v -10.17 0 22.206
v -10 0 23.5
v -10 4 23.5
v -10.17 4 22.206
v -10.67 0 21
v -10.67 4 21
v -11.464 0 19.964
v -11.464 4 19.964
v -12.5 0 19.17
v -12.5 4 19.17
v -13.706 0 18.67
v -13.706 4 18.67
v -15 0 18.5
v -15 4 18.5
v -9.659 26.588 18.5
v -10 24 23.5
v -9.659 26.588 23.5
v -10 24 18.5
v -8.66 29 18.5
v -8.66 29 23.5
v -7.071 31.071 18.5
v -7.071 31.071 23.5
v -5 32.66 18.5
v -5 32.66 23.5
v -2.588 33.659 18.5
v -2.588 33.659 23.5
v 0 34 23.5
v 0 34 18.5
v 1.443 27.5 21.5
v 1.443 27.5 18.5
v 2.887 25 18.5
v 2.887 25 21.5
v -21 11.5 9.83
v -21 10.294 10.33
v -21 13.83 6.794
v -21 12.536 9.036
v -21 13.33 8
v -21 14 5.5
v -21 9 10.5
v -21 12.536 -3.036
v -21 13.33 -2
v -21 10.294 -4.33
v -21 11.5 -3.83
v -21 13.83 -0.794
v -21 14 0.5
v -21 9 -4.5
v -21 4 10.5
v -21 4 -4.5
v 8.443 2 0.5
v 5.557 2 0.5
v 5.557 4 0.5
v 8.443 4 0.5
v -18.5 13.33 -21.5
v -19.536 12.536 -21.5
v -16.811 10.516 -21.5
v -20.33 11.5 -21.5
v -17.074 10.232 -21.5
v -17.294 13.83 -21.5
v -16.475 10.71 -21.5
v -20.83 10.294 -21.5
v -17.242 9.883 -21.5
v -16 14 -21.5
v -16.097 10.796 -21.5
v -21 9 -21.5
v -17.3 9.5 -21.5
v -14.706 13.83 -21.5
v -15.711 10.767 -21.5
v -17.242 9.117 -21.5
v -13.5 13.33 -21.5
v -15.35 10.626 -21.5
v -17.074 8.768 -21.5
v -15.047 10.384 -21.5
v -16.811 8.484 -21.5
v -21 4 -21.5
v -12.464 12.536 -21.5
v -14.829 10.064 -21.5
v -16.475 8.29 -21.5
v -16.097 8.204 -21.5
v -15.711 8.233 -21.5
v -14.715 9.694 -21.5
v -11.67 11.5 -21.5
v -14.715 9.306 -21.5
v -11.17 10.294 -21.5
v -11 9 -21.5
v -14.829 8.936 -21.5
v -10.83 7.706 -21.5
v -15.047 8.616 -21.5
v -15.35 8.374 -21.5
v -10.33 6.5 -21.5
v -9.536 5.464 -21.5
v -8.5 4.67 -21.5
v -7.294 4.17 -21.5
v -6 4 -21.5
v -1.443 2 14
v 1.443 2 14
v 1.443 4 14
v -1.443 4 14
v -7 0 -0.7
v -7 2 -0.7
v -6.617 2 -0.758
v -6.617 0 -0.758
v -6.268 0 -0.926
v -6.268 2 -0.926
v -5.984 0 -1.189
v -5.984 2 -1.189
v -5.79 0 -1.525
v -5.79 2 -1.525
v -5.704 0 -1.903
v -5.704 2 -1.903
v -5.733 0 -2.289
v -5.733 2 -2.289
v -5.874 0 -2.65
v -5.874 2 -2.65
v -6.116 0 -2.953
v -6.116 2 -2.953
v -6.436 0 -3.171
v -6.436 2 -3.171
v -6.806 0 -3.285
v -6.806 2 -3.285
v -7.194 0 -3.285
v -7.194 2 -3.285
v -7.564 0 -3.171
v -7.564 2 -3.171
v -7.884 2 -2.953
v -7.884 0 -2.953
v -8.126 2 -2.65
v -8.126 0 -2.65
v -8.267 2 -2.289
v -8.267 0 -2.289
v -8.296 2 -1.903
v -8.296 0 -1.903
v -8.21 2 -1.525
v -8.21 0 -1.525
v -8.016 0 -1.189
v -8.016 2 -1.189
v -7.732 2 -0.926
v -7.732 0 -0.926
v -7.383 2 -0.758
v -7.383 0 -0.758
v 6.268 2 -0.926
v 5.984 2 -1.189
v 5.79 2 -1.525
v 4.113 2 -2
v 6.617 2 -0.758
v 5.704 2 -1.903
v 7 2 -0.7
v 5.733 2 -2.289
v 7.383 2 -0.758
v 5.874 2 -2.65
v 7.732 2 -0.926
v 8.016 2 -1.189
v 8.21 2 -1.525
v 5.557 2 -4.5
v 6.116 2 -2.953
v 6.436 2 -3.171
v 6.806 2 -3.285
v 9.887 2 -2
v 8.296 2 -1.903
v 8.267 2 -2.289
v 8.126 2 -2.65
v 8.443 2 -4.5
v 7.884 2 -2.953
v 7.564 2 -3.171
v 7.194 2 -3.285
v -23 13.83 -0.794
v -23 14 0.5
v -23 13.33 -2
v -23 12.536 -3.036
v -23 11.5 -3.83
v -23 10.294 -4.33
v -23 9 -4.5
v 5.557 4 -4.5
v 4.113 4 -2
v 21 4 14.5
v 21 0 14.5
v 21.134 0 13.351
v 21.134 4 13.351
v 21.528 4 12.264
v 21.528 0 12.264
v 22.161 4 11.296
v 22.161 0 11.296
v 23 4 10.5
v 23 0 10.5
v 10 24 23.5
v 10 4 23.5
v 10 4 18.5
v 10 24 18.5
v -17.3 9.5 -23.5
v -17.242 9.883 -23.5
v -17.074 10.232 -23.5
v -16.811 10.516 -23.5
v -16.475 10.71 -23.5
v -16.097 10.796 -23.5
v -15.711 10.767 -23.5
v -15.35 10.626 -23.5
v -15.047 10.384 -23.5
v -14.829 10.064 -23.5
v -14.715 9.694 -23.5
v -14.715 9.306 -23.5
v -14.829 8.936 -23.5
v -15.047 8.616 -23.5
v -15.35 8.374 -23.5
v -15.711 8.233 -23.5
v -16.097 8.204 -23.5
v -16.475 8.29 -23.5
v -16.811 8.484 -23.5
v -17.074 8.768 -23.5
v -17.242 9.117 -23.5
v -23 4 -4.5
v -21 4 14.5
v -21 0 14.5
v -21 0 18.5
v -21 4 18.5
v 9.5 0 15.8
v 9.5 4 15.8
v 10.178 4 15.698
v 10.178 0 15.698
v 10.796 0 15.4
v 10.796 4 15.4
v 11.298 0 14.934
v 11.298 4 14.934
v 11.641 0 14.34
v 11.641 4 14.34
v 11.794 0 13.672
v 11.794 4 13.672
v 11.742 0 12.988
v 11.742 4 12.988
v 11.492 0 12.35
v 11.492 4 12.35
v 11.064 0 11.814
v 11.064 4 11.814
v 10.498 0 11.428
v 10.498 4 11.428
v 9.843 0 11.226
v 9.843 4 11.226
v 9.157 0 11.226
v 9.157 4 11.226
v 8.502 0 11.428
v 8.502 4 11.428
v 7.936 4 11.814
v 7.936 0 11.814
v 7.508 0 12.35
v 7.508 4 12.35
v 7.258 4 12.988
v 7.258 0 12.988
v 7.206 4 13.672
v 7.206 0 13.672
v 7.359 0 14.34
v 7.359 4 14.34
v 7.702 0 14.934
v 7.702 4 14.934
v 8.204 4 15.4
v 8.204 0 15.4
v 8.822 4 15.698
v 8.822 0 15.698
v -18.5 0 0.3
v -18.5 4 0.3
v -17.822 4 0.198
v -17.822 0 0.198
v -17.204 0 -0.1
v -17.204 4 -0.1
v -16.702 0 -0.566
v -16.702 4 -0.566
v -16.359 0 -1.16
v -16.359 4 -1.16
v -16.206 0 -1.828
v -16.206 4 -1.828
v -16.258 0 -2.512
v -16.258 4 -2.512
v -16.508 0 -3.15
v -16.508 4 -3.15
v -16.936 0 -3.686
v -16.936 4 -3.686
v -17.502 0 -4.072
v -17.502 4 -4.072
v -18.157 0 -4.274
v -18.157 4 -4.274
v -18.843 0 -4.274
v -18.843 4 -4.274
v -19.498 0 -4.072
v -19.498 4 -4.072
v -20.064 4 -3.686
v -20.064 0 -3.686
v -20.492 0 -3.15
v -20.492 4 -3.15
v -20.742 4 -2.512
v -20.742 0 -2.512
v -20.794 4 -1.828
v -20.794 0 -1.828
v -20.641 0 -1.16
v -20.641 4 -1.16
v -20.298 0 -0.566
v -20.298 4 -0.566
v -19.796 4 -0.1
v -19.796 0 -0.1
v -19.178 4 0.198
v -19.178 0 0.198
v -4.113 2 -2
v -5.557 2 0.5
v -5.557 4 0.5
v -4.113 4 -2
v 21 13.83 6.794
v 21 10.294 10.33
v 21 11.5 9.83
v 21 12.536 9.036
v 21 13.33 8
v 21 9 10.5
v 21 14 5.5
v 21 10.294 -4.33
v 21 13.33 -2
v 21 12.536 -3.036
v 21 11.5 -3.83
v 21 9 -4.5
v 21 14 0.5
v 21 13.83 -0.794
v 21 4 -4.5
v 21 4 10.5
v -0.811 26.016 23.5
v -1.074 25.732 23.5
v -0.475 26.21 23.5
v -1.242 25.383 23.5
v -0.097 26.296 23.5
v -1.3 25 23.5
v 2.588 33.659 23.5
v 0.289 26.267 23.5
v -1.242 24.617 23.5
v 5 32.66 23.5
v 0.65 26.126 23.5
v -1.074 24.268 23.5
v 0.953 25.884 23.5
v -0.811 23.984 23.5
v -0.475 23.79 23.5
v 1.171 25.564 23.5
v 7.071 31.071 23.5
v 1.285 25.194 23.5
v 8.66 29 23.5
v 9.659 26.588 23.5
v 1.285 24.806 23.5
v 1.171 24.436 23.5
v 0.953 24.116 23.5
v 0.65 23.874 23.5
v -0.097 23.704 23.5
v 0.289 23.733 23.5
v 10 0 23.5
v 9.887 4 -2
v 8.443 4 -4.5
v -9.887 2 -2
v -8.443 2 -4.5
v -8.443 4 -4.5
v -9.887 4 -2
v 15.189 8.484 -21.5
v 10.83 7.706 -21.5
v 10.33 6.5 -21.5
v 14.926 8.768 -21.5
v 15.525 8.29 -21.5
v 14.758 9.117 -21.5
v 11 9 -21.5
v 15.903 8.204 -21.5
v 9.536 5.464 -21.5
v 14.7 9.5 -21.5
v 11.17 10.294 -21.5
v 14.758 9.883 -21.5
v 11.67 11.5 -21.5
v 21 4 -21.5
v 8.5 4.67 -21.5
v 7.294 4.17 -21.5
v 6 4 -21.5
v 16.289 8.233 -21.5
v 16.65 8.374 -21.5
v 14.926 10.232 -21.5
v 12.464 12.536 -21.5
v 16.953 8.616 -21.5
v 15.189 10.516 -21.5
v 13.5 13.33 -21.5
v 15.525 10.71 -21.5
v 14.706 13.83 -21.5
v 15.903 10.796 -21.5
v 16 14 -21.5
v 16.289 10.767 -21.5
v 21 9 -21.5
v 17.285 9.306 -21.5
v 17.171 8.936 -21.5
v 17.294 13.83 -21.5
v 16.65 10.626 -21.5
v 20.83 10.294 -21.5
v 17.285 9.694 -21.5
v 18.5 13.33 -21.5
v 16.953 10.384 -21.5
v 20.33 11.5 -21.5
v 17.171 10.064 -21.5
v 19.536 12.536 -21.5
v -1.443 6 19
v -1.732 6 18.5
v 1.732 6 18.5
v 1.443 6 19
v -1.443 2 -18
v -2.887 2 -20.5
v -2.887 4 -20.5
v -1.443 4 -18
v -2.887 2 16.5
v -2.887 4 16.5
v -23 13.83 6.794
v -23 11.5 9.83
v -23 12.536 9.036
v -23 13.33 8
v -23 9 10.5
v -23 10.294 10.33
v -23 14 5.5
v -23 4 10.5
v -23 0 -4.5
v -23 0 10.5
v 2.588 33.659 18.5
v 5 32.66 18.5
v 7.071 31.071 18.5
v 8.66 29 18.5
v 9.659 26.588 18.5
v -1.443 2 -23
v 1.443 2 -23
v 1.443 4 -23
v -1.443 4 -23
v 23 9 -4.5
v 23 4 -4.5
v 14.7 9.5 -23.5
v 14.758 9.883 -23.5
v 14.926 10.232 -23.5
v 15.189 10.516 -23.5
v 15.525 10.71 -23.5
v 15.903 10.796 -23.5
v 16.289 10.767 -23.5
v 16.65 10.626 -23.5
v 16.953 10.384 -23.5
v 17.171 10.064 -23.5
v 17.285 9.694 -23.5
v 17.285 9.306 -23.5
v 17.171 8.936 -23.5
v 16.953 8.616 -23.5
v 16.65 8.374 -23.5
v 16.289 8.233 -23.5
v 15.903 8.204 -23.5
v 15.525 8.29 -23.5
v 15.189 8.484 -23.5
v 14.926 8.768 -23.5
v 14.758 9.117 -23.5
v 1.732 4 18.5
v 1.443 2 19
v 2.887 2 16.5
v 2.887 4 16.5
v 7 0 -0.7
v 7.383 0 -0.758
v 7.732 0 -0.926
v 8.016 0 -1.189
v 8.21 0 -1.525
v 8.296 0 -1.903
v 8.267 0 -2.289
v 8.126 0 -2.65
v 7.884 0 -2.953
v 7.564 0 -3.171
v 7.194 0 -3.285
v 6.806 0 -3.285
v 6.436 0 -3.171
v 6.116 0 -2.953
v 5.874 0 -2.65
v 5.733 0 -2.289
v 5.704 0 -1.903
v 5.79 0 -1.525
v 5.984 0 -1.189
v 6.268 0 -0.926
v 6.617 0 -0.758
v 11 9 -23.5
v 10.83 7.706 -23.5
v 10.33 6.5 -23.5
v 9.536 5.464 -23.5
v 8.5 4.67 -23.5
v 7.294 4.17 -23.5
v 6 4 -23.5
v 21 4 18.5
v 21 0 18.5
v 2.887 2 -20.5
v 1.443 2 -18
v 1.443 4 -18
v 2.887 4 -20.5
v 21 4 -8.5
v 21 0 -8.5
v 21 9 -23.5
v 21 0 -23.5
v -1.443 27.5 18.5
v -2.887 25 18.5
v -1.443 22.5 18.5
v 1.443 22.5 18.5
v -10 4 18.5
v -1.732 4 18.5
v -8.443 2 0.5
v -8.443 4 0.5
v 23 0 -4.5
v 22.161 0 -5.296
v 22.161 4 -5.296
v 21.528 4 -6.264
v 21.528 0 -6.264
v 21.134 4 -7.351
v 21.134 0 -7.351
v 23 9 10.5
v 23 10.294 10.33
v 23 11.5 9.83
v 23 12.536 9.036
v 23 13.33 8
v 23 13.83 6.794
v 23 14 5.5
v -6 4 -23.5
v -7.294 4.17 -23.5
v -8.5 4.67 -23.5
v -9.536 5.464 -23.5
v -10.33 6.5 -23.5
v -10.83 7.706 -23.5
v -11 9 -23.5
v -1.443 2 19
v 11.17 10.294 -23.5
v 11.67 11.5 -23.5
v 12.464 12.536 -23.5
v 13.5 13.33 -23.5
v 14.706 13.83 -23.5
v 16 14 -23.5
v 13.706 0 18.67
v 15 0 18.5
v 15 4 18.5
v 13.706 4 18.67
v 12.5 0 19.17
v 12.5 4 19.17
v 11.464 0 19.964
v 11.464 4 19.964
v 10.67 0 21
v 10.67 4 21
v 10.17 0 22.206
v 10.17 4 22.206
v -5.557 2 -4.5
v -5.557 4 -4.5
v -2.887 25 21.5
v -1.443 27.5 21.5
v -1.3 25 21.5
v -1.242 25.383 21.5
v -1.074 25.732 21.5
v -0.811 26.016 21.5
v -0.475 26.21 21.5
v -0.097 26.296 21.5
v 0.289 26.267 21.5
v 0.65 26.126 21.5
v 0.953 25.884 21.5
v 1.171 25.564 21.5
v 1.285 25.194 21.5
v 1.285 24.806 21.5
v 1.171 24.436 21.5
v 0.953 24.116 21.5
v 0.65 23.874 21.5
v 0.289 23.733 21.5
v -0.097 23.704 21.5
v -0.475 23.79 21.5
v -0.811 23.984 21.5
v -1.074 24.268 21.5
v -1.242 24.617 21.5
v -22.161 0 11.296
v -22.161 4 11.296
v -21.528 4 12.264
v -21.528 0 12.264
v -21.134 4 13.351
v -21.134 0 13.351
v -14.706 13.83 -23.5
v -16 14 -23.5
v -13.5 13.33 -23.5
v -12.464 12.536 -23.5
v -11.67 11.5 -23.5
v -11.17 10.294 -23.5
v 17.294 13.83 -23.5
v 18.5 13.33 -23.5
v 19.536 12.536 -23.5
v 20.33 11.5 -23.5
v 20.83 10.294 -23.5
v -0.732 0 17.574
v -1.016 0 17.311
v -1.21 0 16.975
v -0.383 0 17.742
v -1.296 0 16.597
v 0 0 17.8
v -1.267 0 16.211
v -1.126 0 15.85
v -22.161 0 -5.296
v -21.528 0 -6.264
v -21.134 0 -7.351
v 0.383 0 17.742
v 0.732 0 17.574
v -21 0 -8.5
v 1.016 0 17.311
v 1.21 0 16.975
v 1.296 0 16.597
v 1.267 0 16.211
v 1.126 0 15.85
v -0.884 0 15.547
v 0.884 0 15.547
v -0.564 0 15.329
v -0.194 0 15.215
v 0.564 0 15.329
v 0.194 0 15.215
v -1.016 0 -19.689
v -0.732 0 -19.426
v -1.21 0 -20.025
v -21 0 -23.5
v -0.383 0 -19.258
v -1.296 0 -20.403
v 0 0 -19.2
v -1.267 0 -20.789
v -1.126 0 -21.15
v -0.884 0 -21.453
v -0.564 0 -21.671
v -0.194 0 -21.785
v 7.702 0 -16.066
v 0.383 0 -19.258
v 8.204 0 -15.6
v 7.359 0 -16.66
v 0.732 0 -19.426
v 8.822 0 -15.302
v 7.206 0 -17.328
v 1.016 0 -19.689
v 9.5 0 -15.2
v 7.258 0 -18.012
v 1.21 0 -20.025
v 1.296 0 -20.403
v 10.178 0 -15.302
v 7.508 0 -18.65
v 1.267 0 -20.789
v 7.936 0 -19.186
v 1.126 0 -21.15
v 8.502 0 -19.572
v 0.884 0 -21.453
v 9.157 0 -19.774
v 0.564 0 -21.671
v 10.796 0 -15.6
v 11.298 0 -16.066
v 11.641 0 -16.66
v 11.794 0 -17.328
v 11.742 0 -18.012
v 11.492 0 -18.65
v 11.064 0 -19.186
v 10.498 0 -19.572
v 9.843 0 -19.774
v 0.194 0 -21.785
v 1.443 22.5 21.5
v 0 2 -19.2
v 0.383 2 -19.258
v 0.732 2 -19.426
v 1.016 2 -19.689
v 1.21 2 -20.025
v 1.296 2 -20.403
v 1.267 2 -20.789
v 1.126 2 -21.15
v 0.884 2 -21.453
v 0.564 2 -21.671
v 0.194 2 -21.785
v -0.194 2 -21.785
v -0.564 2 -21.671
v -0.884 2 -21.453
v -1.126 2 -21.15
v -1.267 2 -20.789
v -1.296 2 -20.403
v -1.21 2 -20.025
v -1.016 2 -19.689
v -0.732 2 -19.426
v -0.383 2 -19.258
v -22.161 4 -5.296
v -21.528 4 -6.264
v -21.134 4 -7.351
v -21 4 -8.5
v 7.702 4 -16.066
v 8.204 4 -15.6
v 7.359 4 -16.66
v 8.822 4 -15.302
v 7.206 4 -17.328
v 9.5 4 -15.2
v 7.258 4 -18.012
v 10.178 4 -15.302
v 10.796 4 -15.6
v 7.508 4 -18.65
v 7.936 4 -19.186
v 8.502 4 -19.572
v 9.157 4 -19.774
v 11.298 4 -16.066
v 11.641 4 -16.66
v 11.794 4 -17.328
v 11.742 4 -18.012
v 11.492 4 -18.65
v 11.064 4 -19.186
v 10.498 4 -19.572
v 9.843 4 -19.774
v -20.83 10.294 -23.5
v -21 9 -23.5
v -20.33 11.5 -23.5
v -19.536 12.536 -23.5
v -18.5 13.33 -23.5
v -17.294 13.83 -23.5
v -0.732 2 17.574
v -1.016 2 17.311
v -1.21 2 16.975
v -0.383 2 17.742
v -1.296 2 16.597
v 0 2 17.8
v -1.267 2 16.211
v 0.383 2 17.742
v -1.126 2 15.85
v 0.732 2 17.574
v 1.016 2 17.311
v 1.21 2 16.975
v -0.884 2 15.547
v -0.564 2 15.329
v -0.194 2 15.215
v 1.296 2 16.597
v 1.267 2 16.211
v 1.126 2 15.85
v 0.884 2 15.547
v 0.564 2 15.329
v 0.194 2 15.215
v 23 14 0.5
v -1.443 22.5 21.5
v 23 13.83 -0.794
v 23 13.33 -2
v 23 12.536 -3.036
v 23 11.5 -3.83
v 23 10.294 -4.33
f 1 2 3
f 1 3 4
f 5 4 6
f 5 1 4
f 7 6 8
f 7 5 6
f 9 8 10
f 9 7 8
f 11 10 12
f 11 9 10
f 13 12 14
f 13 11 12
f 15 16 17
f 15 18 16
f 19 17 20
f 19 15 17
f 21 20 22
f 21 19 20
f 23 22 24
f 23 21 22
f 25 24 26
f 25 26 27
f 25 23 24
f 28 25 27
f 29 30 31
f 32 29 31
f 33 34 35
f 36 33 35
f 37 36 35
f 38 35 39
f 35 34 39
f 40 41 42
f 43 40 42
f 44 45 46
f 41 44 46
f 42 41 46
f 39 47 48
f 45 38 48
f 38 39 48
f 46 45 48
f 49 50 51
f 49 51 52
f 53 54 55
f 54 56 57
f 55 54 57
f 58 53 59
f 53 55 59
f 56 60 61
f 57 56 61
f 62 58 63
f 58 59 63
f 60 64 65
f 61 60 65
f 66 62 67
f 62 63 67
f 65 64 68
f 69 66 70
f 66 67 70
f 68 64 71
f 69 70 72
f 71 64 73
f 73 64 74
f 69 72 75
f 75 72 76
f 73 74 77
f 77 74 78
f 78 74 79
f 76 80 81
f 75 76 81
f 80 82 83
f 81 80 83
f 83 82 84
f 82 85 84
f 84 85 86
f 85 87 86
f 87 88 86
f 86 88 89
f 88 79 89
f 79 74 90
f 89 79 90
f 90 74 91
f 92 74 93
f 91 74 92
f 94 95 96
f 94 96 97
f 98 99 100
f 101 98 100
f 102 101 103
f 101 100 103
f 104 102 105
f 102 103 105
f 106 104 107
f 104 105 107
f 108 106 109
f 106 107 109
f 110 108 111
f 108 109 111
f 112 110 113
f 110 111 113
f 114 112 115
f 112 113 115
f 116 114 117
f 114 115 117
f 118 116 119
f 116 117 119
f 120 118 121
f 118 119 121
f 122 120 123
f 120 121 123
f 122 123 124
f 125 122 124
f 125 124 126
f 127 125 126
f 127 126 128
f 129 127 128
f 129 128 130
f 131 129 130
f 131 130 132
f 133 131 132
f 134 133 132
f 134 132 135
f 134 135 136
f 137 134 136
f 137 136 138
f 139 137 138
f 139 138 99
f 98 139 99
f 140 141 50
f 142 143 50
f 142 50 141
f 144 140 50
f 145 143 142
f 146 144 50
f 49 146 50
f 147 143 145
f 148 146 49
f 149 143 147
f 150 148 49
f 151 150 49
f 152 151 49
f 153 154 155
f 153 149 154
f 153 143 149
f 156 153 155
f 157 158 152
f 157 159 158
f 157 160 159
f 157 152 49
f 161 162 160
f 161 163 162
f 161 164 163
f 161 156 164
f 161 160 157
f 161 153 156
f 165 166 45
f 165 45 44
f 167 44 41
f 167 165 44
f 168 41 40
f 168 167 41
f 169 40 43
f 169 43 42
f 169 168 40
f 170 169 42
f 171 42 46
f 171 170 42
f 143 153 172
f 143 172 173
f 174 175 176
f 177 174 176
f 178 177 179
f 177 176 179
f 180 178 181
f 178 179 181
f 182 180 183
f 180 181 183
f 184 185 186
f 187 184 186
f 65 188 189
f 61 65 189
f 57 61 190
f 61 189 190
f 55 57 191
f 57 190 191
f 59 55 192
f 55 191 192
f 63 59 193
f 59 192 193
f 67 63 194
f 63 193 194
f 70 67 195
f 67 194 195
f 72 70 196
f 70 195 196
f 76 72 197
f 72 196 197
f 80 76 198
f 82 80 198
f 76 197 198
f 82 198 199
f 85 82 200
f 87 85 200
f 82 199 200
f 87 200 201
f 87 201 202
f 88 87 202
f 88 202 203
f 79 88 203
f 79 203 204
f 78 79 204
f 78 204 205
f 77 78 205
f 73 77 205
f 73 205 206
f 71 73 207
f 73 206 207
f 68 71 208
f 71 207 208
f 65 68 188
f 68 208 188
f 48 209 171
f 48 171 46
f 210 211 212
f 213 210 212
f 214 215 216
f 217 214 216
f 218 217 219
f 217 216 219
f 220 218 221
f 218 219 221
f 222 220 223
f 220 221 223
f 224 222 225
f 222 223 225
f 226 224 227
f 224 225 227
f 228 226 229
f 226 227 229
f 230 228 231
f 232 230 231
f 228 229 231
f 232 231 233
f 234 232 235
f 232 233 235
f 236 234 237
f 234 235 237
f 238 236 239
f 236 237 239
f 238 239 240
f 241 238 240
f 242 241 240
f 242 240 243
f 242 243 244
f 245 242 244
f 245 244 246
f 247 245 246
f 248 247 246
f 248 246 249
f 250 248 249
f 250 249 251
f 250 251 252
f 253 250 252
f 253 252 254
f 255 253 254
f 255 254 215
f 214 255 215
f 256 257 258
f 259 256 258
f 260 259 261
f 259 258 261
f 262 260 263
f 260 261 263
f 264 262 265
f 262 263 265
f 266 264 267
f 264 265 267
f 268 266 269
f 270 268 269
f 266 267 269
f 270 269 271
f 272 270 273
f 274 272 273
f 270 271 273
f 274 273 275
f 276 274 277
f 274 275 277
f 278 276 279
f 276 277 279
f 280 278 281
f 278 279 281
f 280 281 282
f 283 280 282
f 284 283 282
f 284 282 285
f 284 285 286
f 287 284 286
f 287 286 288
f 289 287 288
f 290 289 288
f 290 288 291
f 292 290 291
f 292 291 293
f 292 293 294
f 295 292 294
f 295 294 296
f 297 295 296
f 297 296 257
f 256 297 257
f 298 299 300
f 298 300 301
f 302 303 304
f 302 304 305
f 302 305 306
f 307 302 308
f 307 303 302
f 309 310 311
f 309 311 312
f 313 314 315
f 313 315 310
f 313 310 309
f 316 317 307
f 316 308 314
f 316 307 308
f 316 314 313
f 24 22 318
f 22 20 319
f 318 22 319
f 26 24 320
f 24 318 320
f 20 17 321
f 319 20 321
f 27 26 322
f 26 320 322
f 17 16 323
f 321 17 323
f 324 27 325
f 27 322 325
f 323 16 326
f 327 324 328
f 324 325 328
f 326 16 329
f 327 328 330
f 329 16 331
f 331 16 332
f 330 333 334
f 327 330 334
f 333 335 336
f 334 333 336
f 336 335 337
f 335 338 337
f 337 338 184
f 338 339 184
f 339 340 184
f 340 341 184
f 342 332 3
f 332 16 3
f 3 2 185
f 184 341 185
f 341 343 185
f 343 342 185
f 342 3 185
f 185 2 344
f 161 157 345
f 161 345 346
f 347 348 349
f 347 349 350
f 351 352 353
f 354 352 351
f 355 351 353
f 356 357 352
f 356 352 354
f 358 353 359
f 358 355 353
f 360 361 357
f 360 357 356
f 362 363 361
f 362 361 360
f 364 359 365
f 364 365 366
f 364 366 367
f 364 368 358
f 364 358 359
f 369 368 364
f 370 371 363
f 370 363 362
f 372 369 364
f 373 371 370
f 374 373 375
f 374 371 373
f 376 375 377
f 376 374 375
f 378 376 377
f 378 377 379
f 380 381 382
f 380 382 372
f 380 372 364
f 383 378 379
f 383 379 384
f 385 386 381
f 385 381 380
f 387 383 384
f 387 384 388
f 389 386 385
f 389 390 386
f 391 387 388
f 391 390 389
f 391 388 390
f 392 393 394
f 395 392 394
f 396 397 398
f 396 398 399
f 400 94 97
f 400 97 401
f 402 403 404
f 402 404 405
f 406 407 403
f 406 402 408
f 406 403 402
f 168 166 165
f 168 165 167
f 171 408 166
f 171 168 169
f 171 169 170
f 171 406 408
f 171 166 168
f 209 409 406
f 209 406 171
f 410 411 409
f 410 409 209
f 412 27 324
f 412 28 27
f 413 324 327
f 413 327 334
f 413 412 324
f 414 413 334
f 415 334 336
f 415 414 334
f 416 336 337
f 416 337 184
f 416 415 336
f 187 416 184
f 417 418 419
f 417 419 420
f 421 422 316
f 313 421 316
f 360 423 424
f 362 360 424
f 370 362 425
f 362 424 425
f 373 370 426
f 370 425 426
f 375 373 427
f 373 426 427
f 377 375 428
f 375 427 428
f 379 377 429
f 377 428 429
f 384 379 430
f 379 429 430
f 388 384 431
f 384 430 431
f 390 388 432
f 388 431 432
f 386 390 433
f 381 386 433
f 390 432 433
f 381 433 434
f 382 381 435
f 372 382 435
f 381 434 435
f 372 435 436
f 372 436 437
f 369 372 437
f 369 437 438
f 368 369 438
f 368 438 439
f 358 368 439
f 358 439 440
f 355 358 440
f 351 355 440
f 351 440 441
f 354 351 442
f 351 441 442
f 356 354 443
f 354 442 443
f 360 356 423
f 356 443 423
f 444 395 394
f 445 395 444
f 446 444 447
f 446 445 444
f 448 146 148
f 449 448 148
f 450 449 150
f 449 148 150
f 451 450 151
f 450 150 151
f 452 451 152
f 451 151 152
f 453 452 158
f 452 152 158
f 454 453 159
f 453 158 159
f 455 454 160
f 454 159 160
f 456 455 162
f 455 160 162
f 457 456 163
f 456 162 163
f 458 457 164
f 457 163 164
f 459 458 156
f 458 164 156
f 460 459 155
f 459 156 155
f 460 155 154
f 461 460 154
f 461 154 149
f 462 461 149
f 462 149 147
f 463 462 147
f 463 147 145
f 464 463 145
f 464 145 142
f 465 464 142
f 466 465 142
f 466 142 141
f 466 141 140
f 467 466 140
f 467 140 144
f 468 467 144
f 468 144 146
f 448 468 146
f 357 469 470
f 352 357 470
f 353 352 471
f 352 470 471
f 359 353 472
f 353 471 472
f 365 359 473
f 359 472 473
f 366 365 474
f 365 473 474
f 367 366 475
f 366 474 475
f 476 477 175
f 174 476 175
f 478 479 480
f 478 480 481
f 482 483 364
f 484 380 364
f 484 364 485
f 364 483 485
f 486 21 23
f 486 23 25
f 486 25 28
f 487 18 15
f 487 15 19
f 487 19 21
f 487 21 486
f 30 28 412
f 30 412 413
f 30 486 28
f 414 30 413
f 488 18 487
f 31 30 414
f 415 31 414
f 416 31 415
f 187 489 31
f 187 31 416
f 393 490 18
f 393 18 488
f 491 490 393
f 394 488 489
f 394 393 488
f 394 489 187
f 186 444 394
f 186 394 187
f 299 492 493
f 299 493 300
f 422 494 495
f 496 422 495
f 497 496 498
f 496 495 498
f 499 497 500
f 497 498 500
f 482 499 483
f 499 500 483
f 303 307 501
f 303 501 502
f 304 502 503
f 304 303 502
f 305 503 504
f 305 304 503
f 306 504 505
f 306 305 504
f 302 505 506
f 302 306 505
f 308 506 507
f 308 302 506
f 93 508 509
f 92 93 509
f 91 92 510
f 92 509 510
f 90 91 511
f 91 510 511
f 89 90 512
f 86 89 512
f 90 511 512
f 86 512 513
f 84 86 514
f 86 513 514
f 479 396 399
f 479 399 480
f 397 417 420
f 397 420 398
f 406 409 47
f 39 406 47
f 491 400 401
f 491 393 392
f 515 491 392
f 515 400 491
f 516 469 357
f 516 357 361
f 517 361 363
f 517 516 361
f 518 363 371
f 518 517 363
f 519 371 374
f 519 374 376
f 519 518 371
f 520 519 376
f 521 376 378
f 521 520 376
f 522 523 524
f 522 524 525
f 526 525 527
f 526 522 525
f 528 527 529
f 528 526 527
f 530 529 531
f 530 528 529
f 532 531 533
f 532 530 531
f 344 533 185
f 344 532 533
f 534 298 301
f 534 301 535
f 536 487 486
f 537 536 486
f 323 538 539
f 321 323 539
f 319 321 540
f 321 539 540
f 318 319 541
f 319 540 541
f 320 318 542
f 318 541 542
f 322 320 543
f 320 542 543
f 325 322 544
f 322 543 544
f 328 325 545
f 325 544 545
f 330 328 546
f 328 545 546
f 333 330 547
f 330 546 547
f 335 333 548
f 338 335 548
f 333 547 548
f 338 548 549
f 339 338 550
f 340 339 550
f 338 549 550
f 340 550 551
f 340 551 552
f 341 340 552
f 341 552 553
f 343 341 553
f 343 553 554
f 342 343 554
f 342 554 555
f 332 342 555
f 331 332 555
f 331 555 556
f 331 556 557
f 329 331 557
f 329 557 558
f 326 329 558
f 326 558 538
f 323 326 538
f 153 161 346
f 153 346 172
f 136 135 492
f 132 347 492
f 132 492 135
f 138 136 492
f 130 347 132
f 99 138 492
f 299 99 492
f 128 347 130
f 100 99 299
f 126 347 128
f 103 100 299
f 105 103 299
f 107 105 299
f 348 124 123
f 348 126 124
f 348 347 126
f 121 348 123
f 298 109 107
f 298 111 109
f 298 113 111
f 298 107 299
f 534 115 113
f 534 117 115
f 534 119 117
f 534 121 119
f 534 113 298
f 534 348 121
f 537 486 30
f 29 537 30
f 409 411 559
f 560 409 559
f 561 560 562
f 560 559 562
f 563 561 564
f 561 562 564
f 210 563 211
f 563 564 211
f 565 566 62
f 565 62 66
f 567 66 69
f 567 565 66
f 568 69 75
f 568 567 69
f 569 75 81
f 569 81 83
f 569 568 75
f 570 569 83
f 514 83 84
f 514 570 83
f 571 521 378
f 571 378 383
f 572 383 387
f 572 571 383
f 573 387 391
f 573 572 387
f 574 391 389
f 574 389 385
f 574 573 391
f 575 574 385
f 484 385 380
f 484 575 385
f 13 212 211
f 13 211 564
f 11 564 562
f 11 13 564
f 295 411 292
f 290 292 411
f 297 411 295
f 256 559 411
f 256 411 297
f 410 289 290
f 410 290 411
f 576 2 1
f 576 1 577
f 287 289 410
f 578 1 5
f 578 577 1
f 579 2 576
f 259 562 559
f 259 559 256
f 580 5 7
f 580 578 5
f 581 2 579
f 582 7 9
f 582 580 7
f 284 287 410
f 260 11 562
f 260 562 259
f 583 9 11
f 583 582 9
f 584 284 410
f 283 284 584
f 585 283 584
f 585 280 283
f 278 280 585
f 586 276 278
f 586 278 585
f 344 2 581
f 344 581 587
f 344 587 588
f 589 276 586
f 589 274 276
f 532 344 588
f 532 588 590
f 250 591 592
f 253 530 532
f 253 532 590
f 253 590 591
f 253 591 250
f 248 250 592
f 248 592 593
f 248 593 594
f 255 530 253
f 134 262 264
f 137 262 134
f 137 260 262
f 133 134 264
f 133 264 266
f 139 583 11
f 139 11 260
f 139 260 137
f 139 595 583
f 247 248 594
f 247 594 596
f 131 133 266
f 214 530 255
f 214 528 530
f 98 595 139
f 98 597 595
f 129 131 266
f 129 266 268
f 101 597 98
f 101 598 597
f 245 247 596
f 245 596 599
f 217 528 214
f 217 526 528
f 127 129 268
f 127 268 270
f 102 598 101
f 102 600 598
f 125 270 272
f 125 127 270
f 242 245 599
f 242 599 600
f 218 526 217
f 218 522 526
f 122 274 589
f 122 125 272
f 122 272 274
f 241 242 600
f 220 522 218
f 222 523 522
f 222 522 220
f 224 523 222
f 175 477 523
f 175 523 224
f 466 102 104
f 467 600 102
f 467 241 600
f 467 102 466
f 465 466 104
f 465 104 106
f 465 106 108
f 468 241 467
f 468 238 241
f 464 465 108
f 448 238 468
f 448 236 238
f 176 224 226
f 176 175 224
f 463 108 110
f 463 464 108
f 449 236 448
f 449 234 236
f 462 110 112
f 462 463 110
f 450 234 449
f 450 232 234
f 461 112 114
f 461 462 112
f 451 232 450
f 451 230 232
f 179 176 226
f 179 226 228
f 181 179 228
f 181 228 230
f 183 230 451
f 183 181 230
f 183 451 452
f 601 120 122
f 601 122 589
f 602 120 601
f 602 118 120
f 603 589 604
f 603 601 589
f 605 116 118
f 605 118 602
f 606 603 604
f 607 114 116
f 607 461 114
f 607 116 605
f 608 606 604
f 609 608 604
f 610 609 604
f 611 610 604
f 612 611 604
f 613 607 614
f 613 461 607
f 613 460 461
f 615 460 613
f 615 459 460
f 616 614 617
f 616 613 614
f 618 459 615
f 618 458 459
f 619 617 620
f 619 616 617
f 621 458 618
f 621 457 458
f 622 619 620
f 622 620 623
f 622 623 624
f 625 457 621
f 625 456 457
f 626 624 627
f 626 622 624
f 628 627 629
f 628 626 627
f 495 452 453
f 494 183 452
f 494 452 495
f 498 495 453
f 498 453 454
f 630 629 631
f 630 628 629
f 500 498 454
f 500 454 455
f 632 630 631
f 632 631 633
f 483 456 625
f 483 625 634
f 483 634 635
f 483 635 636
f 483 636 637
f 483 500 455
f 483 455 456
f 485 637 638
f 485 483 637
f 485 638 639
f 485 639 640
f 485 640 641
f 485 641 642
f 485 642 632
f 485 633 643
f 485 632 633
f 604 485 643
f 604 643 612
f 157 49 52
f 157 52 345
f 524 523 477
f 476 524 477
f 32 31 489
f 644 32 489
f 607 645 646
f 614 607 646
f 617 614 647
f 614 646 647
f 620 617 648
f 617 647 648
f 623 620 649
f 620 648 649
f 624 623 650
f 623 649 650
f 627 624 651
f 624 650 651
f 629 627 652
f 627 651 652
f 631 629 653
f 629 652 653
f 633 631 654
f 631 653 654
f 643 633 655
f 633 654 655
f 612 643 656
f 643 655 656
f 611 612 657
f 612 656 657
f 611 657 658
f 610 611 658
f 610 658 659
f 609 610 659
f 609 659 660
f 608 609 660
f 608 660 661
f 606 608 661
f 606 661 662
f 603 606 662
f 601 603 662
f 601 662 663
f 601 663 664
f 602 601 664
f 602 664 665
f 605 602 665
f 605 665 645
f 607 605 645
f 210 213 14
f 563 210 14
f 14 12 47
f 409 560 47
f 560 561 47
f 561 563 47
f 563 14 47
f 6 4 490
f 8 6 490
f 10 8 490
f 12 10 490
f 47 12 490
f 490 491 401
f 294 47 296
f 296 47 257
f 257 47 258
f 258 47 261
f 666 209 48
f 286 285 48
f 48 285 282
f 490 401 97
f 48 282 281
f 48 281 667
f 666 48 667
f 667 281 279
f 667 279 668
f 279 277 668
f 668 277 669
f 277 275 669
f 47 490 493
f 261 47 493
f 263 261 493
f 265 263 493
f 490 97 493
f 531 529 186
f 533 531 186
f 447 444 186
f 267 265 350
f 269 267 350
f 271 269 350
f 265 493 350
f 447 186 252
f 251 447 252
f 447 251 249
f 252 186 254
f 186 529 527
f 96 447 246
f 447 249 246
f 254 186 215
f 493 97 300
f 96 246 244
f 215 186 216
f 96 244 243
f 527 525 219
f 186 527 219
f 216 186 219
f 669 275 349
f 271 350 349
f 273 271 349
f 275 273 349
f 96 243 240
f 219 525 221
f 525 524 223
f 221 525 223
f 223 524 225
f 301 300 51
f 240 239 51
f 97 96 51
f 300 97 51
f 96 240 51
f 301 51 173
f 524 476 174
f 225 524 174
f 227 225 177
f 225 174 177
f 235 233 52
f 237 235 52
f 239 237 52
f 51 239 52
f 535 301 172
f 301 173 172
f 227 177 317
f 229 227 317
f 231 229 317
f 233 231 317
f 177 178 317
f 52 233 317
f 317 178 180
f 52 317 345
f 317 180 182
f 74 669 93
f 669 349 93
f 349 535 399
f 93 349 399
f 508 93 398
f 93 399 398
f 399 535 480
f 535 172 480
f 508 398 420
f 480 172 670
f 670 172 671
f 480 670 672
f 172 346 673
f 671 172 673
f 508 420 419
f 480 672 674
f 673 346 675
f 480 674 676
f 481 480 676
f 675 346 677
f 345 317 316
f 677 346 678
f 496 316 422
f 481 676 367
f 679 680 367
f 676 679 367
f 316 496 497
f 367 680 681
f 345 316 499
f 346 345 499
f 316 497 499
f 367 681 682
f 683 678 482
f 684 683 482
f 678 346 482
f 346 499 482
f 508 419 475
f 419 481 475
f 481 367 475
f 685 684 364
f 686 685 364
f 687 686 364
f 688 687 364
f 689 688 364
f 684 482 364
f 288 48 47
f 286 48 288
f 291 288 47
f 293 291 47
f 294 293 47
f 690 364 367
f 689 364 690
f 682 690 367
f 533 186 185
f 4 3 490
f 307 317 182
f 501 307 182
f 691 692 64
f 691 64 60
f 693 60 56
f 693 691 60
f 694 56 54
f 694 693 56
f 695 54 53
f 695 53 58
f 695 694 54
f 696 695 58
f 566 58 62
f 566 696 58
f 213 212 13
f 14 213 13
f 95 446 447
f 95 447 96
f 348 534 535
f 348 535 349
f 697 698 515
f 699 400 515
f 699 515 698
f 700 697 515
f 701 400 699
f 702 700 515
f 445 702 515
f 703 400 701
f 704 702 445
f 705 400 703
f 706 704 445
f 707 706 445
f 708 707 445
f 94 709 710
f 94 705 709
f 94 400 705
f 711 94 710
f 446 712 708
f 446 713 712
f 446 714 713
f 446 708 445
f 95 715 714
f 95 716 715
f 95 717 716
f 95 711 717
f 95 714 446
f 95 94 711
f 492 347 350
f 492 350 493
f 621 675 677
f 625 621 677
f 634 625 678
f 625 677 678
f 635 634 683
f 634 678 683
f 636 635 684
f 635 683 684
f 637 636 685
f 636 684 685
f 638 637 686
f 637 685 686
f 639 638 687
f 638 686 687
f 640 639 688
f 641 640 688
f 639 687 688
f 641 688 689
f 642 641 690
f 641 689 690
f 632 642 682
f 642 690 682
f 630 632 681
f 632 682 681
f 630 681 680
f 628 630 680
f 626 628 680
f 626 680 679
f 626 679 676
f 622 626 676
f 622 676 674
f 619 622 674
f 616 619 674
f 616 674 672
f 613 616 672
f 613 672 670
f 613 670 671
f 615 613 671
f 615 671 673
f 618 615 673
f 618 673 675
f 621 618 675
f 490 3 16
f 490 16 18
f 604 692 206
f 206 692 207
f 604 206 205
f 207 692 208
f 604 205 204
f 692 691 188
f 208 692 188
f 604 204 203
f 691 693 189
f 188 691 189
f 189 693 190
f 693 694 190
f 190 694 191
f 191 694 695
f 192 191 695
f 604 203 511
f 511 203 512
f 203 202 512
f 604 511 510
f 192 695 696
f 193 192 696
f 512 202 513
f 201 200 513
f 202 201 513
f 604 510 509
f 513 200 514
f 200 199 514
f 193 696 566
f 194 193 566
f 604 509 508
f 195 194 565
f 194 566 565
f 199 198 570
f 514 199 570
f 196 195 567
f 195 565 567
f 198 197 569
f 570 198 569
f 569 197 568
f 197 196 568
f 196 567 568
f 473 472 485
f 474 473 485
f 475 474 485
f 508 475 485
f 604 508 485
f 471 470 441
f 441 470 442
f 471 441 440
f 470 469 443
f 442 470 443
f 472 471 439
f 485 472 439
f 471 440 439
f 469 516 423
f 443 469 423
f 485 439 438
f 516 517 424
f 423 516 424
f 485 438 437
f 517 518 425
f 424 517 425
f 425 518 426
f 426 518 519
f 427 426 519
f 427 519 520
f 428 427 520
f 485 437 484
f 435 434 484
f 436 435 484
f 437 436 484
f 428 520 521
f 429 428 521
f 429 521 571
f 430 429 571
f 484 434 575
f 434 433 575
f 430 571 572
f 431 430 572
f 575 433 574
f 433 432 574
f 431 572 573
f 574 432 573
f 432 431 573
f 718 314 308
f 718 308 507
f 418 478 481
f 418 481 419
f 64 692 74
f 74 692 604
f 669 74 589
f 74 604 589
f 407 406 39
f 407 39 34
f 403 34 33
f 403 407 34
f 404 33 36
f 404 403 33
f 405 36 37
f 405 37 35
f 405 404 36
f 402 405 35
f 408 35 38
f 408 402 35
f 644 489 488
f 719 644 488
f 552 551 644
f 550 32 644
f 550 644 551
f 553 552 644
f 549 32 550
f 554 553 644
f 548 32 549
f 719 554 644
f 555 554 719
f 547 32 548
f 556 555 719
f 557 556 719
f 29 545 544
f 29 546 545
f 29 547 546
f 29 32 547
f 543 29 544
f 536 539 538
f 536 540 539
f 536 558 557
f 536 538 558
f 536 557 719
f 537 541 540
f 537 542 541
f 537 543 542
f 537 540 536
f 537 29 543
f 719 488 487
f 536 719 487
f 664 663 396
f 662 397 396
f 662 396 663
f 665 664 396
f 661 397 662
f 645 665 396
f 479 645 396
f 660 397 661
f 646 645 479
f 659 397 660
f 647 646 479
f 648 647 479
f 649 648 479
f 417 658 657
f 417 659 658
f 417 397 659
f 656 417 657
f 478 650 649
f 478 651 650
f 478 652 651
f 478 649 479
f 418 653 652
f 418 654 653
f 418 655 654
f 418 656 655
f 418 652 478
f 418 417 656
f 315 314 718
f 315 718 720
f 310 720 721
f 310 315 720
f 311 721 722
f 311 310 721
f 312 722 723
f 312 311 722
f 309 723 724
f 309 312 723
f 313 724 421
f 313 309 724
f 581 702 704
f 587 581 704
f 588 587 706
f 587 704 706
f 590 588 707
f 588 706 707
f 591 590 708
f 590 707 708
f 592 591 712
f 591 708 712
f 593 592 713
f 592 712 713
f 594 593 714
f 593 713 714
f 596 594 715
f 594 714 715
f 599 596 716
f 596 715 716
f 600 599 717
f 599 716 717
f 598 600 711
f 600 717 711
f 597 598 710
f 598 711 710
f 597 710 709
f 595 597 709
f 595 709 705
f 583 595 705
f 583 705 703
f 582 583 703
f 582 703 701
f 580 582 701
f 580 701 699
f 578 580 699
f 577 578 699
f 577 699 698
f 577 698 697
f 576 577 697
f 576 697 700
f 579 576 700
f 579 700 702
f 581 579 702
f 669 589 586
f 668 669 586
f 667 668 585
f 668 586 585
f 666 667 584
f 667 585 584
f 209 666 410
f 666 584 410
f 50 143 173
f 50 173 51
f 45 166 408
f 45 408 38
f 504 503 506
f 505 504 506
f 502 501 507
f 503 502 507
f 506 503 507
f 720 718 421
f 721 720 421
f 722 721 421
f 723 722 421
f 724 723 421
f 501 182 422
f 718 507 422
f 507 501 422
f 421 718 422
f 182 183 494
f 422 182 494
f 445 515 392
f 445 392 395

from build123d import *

# Parameters (mm, degrees)
EXTRUDE_1_DEPTH          = 4
SKETCH_2_W               = 2
SKETCH_2_H               = 15
SKETCH_2_W_2             = 10
SKETCH_2_H_2             = 2
EXTRUDE_2_DEPTH          = 10
SKETCH_3_W               = 20
SKETCH_3_H               = 5
EXTRUDE_3_DEPTH          = 30
SKETCH_4_R               = 1.3
CUT_EXTRUDE_1_DEPTH      = 2
SKETCH_5_R               = 1.3
CUT_EXTRUDE_2_DEPTH      = 59.72818744
CUT_EXTRUDE_3_DEPTH      = 3
SKETCH_7_R               = 1.3
SKETCH_7_R_2             = 2.3
CUT_EXTRUDE_5_DEPTH      = 45.511234537
CUT_EXTRUDE_6_DEPTH      = 2
CUT_EXTRUDE_6_DEPTH_BACK = 2
FILLET_1_R               = 10
FILLET_2_DEPTH           = 4
FILLET_START             = -23.5
FILLET_2_2_DEPTH         = 2
FILLET_START_2           = -24
FILLET_2_3_DEPTH         = 48
FILLET_2_4_DEPTH         = 2
FILLET_3_R               = 5


with BuildPart() as part:
    # 草图1 → 凸台-拉伸1 (new body)
    with BuildSketch(Plane(origin=(0, 0, 0), x_dir=(1, 0, 0), z_dir=(0, 1, 0))):
        Polygon((-21, 23.5), (-21, 4.5), (-23, 4.5), (-23, -10.5), (-21, -10.5), (-21, -18.5), (-11, -18.5), (-10, -18.5), (-10, -23.5), (10, -23.5), (10, -18.5), (11, -18.5), (21, -18.5), (21, -10.5), (23, -10.5), (23, 4.5), (21, 4.5), (21, 23.5), align=None)
    extrude(amount=EXTRUDE_1_DEPTH)

    # 草图2 → 凸台-拉伸2 (add)
    with BuildSketch(Plane(origin=(0, 4, 0), x_dir=(1, 0, 0), z_dir=(0, 1, 0))):
        with Locations((-22, -3)):
            Rectangle(SKETCH_2_W, SKETCH_2_H)
        with Locations((-16, 22.5)):
            Rectangle(SKETCH_2_W_2, SKETCH_2_H_2)
        with Locations((16, 22.5)):
            Rectangle(SKETCH_2_W_2, SKETCH_2_H_2)
        with Locations((22, -3)):
            Rectangle(SKETCH_2_W, SKETCH_2_H)
    extrude(amount=EXTRUDE_2_DEPTH)

    # 草图3 → 凸台-拉伸3 (add)
    with BuildSketch(Plane(origin=(0, 4, 0), x_dir=(1, 0, 0), z_dir=(0, 1, 0))):
        with Locations((0, -21)):
            Rectangle(SKETCH_3_W, SKETCH_3_H)
    extrude(amount=EXTRUDE_3_DEPTH)

    # 草图4 → 切除-拉伸1 (cut)
    with BuildSketch(Plane(origin=(0, 0, -23.5), x_dir=(-1, 0, 0), z_dir=(0, 0, -1))):
        with Locations((-16, 9.5)):
            Circle(SKETCH_4_R)
        with Locations((16, 9.5)):
            Circle(SKETCH_4_R)
    extrude(amount=-CUT_EXTRUDE_1_DEPTH, mode=Mode.SUBTRACT)

    # 草图5 → 切除-拉伸2 (cut, through all)
    with BuildSketch(Plane(origin=(0, 0, 18.5), x_dir=(-1, 0, 0), z_dir=(0, 0, -1))):
        with Locations((0, 25)):
            Circle(SKETCH_5_R)
    extrude(amount=-CUT_EXTRUDE_2_DEPTH, mode=Mode.SUBTRACT)

    # 草图6 → 切除-拉伸3 (cut)
    with BuildSketch(Plane(origin=(0, 0, 18.5), x_dir=(-1, 0, 0), z_dir=(0, 0, -1))):
        Polygon((2.886751346, 25), (1.443375673, 27.5), (-1.443375673, 27.5), (-2.886751346, 25), (-1.443375673, 22.5), (1.443375673, 22.5), align=None)
    extrude(amount=-CUT_EXTRUDE_3_DEPTH, mode=Mode.SUBTRACT)

    # 草图7 → 切除-拉伸5 (cut, through all)
    with BuildSketch(Plane(origin=(0, 4, 0), x_dir=(1, 0, 0), z_dir=(0, 1, 0))):
        with Locations(Location((0, 20.5, 0), (0, 0, 270))):
            Circle(SKETCH_7_R)
        with Locations(Location((-7, 2, 0), (0, 0, 270))):
            Circle(SKETCH_7_R)
        with Locations(Location((7, 2, 0), (0, 0, 270))):
            Circle(SKETCH_7_R)
        with Locations(Location((0, -16.5, 0), (0, 0, 270))):
            Circle(SKETCH_7_R)
        with Locations(Location((-18.5, 2, 0), (0, 0, 270))):
            Circle(SKETCH_7_R_2)
        with Locations(Location((9.5, 17.5, 0), (0, 0, 270))):
            Circle(SKETCH_7_R_2)
        with Locations(Location((9.5, -13.5, 0), (0, 0, 270))):
            Circle(SKETCH_7_R_2)
    extrude(amount=-CUT_EXTRUDE_5_DEPTH, mode=Mode.SUBTRACT)

    # 草图8 → 切除-拉伸6 (cut, two sides: drawn at the far end of the back side and taken through both)
    with BuildSketch(Plane(origin=(0, 4, 0), x_dir=(1, 0, 0), z_dir=(0, 1, 0)).offset(-CUT_EXTRUDE_6_DEPTH_BACK)):
        Polygon((9.886751346, 2), (8.443375673, 4.5), (5.556624327, 4.5), (4.113248654, 2), (5.556624327, -0.5), (8.443375673, -0.5), align=None)
        Polygon((-4.113248654, 2), (-5.556624327, 4.5), (-8.443375673, 4.5), (-9.886751346, 2), (-8.443375673, -0.5), (-5.556624327, -0.5), align=None)
        Polygon((2.886751346, 20.5), (1.443375673, 23), (-1.443375673, 23), (-2.886751346, 20.5), (-1.443375673, 18), (1.443375673, 18), align=None)
        Polygon((2.886751346, -16.5), (1.443375673, -14), (-1.443375673, -14), (-2.886751346, -16.5), (-1.443375673, -19), (1.443375673, -19), align=None)
    extrude(amount=CUT_EXTRUDE_6_DEPTH + CUT_EXTRUDE_6_DEPTH_BACK, mode=Mode.SUBTRACT)

    # 圆角1
    fillet_1_edges = [part.edges().sort_by_distance(p)[0] for p in [
        (-10, 34, 21),
        (10, 34, 21),
    ]]
    fillet(fillet_1_edges, radius=FILLET_1_R - 0.0001)  # a hair under: the kernel refuses the full size

    # 圆角2: read off the stored shape, not the designer's step
    # 圆角2 outline → 圆角2 (add)
    with BuildSketch(Plane(origin=(0, 0, 0), x_dir=(1, 0, 0), z_dir=(0, 1, 0))):
        with BuildLine():
            Line((-21, 4.5), (-21, 8.5))
            ThreePointArc((-21, 8.5), (-21.527864045, 6.263932023), (-23, 4.5))
            Line((-23, 4.5), (-21, 4.5))
        make_face()
        with BuildLine():
            ThreePointArc((21, -14.5), (21.527864045, -12.263932023), (23, -10.5))
            Line((23, -10.5), (21, -10.5))
            Line((21, -10.5), (21, -14.5))
        make_face()
        with BuildLine():
            Line((21, 4.5), (23, 4.5))
            ThreePointArc((23, 4.5), (21.527864045, 6.263932023), (21, 8.5))
            Line((21, 8.5), (21, 4.5))
        make_face()
        with BuildLine():
            Line((-21, -10.5), (-23, -10.5))
            ThreePointArc((-23, -10.5), (-21.527864045, -12.263932023), (-21, -14.5))
            Line((-21, -14.5), (-21, -10.5))
        make_face()
    extrude(amount=FILLET_2_DEPTH)

    # Fillet 2 2 outline → Fillet 2 2 (add)
    with BuildSketch(Plane.XY.offset(FILLET_START)):
        with BuildLine():
            Line((11, 4), (11, 9))
            ThreePointArc((11, 9), (9.535533906, 5.464466094), (6, 4))
            Line((6, 4), (11, 4))
        make_face()
        with BuildLine():
            Line((-11, 4), (-6, 4))
            ThreePointArc((-6, 4), (-9.535533906, 5.464466094), (-11, 9))
            Line((-11, 9), (-11, 4))
        make_face()
    extrude(amount=FILLET_2_2_DEPTH)

    # Fillet 2 3 outline → Fillet 2 3 (cut)
    with BuildSketch(Plane.YZ.offset(FILLET_START_2)):
        with BuildLine():
            Line((14, 10.5), (9, 10.5))
            ThreePointArc((9, 10.5), (12.535533906, 9.035533906), (14, 5.5))
            Line((14, 5.5), (14, 10.5))
        make_face()
        with BuildLine():
            Line((14, -4.5), (14, 0.5))
            ThreePointArc((14, 0.5), (12.535533906, -3.035533906), (9, -4.5))
            Line((9, -4.5), (14, -4.5))
        make_face()
    extrude(amount=FILLET_2_3_DEPTH, mode=Mode.SUBTRACT)

    # Fillet 2 4 outline → Fillet 2 4 (cut)
    with BuildSketch(Plane.XY.offset(FILLET_START)):
        with BuildLine():
            ThreePointArc((16, 14), (19.535533906, 12.535533906), (21, 9))
            Line((21, 9), (21, 14))
            Line((21, 14), (16, 14))
        make_face()
        with BuildLine():
            ThreePointArc((11, 9), (12.464466094, 12.535533906), (16, 14))
            Line((16, 14), (11, 14))
            Line((11, 14), (11, 9))
        make_face()
        with BuildLine():
            ThreePointArc((-16, 14), (-12.464466094, 12.535533906), (-11, 9))
            Line((-11, 9), (-11, 14))
            Line((-11, 14), (-16, 14))
        make_face()
        with BuildLine():
            Line((-21, 14), (-21, 9))
            ThreePointArc((-21, 9), (-19.535533906, 12.535533906), (-16, 14))
            Line((-16, 14), (-21, 14))
        make_face()
    extrude(amount=FILLET_2_4_DEPTH, mode=Mode.SUBTRACT)

    # 圆角3
    # the kernel refuses this fillet: 5 mm, written as the material it adds along each edge
    with BuildSketch(Plane(origin=(10, 0, 18.5), x_dir=(0, 0, 1), z_dir=(0, 1, 0))) as fillet_3_piece_1:
        with BuildLine():
            CenterArc((FILLET_3_R, FILLET_3_R), FILLET_3_R, 180, 90)
            Line((0, FILLET_3_R), (0, 0))
            Line((0, 0), (FILLET_3_R, 0))
        make_face()
    extrude(amount=4)
    with BuildSketch(Plane(origin=(-10, 0, 18.5), x_dir=(0, 0, 1), z_dir=(0, 1, 0))) as fillet_3_piece_2:
        with BuildLine():
            CenterArc((FILLET_3_R, -FILLET_3_R), FILLET_3_R, 90, 90)
            Line((0, -FILLET_3_R), (0, 0))
            Line((0, 0), (FILLET_3_R, 0))
        make_face()
    extrude(amount=4)


solid = part.part
